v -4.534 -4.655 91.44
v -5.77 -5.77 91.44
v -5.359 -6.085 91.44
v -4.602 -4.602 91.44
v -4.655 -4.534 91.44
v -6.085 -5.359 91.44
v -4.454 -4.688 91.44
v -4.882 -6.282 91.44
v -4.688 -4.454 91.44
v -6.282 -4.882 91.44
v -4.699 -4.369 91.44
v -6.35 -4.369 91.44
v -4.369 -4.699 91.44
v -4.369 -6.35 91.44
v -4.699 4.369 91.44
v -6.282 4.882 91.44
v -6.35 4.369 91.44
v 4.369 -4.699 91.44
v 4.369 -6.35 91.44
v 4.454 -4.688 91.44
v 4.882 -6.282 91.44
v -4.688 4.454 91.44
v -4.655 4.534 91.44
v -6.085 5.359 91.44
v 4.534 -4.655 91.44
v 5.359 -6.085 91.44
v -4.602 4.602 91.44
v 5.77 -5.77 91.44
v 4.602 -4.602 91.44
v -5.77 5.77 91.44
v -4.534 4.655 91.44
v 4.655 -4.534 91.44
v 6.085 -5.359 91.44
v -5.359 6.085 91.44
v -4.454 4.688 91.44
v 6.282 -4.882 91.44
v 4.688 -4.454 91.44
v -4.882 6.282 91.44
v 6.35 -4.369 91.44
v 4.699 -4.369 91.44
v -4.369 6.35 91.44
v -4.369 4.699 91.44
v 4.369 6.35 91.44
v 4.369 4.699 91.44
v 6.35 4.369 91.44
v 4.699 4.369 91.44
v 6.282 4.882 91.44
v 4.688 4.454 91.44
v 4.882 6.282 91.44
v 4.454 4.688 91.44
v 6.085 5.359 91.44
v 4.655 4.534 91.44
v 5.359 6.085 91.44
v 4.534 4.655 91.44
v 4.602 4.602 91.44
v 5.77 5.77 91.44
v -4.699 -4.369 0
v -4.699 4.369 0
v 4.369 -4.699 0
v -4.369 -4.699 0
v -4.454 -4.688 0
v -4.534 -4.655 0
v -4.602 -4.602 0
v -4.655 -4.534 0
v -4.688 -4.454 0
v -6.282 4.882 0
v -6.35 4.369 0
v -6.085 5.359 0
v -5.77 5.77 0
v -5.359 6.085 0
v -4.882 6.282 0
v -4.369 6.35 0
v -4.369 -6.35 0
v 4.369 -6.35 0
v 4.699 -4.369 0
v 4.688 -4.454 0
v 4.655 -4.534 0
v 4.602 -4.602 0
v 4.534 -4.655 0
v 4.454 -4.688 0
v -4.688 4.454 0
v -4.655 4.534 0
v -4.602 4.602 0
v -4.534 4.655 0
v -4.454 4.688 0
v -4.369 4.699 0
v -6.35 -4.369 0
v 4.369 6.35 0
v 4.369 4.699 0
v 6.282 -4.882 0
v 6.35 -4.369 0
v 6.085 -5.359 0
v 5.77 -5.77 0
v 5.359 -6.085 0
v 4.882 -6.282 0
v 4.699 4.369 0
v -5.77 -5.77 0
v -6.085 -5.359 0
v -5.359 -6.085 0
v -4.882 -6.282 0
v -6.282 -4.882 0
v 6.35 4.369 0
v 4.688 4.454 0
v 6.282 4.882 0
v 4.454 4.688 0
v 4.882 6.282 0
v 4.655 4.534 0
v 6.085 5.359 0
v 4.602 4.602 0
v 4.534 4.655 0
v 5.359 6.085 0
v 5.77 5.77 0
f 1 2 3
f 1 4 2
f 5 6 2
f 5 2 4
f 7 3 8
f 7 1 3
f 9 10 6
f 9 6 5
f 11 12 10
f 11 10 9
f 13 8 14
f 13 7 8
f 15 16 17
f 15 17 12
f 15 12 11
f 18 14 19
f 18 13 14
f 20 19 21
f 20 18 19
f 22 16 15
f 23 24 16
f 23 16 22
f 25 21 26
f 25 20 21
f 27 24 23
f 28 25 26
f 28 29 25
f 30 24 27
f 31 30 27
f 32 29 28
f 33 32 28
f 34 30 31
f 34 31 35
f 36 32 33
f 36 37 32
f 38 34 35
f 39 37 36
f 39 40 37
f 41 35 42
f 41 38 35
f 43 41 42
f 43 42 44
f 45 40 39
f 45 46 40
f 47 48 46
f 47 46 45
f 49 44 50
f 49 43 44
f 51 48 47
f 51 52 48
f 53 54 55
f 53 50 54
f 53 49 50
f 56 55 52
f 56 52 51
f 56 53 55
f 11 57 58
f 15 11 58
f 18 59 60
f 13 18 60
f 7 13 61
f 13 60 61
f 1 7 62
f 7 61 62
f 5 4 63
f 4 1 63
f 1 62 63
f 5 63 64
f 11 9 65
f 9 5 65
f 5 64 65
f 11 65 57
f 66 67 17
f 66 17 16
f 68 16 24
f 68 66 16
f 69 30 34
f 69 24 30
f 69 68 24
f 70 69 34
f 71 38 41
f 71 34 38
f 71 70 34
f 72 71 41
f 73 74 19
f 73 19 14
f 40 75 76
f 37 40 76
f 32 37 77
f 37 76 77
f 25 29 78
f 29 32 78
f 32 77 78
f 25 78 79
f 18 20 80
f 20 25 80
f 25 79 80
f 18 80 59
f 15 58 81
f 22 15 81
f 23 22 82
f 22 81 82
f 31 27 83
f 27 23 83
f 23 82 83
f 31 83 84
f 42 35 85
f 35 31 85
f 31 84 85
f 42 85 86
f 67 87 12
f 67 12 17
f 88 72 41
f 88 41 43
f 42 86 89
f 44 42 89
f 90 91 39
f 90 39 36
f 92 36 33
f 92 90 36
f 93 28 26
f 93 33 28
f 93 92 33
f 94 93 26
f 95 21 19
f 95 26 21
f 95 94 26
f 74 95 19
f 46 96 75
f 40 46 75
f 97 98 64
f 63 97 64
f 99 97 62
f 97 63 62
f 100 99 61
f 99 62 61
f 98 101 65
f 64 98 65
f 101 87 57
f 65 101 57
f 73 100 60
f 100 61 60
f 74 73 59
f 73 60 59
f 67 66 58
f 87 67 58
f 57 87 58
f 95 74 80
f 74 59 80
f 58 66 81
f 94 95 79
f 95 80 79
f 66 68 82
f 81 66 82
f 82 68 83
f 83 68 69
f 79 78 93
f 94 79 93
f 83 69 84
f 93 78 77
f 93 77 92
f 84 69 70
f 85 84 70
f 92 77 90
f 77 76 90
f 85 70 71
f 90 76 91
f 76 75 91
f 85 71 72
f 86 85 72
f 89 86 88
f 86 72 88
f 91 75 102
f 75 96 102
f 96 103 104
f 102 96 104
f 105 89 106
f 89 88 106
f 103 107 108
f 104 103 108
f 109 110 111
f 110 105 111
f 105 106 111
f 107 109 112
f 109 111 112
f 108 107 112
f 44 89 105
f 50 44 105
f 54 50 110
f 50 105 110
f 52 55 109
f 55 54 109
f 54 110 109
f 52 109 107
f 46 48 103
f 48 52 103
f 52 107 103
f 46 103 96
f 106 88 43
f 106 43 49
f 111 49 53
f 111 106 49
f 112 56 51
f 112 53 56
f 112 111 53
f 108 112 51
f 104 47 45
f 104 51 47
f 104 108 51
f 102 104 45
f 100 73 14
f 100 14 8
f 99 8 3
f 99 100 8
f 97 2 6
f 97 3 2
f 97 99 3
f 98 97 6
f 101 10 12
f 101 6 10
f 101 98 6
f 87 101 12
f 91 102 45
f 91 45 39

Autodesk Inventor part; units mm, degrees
ref_plane "YZ Plane" through (0, 0, 0) normal (1, 0, 0) x (0, 1, 0)
ref_plane "Start plane" through (0, 0, 0) normal (0, 0, 1) x (1, 0, 0)
ref_plane "End plane" through (0, 0, 91.44) normal (0, 0, 1) x (1, 0, 0)
sketch "Sketch" plane through (0, 0, 0) normal (0, 0, 1) x (1, 0, 0)
  line L0 (-6.35, -4.3688) -> (-6.35, 4.3688)
  line L1 (-4.3688, 6.35) -> (4.3688, 6.35)
  line L2 (6.35, 4.3688) -> (6.35, -4.3688)
  line L3 (4.3688, -6.35) -> (-4.3688, -6.35)
  arc A0 (-6.35, -4.3688) -> (-4.3688, -6.35) centre (-4.3688, -4.3688) ccw
  arc A1 (-4.3688, 6.35) -> (-6.35, 4.3688) centre (-4.3688, 4.3688) ccw
  arc A2 (6.35, 4.3688) -> (4.3688, 6.35) centre (4.3688, 4.3688) ccw
  arc A3 (4.3688, -6.35) -> (6.35, -4.3688) centre (4.3688, -4.3688) ccw
  arc A4 (-4.3688, 4.699) -> (-4.699, 4.3688) centre (-4.3688, 4.3688) ccw
  line L4 (-4.3688, 4.699) -> (4.3688, 4.699)
  arc A5 (4.699, 4.3688) -> (4.3688, 4.699) centre (4.3688, 4.3688) ccw
  line L5 (4.699, 4.3688) -> (4.699, -4.3688)
  arc A6 (4.3688, -4.699) -> (4.699, -4.3688) centre (4.3688, -4.3688) ccw
  line L6 (4.3688, -4.699) -> (-4.3688, -4.699)
  arc A7 (-4.699, -4.3688) -> (-4.3688, -4.699) centre (-4.3688, -4.3688) ccw
  line L7 (-4.699, -4.3688) -> (-4.699, 4.3688)
  line L8 (0, 9.4644) -> (0, -9.4644) construction
  line L9 (-10.1124, 0) -> (13.3521, 0) construction
  dimension "d10" = 12.7
  dimension "d11" = 12.7
  dimension "d12" = 1.651
  dimension "d15" = 6.35
  dimension "d16" = 6.35
  dimension "d17" = 1.9812
extrude "Body" add sketch "Sketch" along normal up to surface (91.44 mm away) from surface at 0
sketch "Sketch3" plane through (0, 0, 0) normal (0, 0, 1) x (1, 0, 0)
  line L0 (0, 0) -> (10, 0)
ref_plane "Work Plane3" through (0, 0, 0) normal (0, -1, 0) x (1, 0, 0)
sketch "Sketch4" plane through (0, 0, 0) normal (0, -1, 0) x (1, 0, 0)
  line L0 (-2, 0) -> (12, 0)
  line L1 (-2, 91.44) -> (12, 91.44)
  dimension "d19" = 91.44
sketch "Sketch5" plane through (-6.35, 4.3688, 0) normal (-1, 0, 0) x (0, 0, 1)
  point P0 (0, -4.3688)
equation "\"d10\" = G_H"
equation "\"d11\" = G_W"
equation "\"d12\" = G_T"
equation "\"d15\" = 0.5 * d10"
equation "\"d16\" = 0.5 * d11"
equation "\"d17\" = G_IR"
equation "\"d3\" = G_L"
equation "\"G_W\" = 12.7"
equation "\"G_H\" = 12.7"
equation "\"G_T\" = 1.651"
equation "\"G_IR\" = 1.2 * G_T"
equation "\"G_L\" = d19"
equation "\"G_OFFSET_START\" = 0"
equation "\"G_OFFSET_END\" = 0"
equation "\"d14\" = G_OFFSET_END + B_L"
equation "\"B_L\" = 91.44"
properties part number "ASTM A513 - 1/2 x 1/2 x 13/200 - 3.6" material "Steel, Mild"
